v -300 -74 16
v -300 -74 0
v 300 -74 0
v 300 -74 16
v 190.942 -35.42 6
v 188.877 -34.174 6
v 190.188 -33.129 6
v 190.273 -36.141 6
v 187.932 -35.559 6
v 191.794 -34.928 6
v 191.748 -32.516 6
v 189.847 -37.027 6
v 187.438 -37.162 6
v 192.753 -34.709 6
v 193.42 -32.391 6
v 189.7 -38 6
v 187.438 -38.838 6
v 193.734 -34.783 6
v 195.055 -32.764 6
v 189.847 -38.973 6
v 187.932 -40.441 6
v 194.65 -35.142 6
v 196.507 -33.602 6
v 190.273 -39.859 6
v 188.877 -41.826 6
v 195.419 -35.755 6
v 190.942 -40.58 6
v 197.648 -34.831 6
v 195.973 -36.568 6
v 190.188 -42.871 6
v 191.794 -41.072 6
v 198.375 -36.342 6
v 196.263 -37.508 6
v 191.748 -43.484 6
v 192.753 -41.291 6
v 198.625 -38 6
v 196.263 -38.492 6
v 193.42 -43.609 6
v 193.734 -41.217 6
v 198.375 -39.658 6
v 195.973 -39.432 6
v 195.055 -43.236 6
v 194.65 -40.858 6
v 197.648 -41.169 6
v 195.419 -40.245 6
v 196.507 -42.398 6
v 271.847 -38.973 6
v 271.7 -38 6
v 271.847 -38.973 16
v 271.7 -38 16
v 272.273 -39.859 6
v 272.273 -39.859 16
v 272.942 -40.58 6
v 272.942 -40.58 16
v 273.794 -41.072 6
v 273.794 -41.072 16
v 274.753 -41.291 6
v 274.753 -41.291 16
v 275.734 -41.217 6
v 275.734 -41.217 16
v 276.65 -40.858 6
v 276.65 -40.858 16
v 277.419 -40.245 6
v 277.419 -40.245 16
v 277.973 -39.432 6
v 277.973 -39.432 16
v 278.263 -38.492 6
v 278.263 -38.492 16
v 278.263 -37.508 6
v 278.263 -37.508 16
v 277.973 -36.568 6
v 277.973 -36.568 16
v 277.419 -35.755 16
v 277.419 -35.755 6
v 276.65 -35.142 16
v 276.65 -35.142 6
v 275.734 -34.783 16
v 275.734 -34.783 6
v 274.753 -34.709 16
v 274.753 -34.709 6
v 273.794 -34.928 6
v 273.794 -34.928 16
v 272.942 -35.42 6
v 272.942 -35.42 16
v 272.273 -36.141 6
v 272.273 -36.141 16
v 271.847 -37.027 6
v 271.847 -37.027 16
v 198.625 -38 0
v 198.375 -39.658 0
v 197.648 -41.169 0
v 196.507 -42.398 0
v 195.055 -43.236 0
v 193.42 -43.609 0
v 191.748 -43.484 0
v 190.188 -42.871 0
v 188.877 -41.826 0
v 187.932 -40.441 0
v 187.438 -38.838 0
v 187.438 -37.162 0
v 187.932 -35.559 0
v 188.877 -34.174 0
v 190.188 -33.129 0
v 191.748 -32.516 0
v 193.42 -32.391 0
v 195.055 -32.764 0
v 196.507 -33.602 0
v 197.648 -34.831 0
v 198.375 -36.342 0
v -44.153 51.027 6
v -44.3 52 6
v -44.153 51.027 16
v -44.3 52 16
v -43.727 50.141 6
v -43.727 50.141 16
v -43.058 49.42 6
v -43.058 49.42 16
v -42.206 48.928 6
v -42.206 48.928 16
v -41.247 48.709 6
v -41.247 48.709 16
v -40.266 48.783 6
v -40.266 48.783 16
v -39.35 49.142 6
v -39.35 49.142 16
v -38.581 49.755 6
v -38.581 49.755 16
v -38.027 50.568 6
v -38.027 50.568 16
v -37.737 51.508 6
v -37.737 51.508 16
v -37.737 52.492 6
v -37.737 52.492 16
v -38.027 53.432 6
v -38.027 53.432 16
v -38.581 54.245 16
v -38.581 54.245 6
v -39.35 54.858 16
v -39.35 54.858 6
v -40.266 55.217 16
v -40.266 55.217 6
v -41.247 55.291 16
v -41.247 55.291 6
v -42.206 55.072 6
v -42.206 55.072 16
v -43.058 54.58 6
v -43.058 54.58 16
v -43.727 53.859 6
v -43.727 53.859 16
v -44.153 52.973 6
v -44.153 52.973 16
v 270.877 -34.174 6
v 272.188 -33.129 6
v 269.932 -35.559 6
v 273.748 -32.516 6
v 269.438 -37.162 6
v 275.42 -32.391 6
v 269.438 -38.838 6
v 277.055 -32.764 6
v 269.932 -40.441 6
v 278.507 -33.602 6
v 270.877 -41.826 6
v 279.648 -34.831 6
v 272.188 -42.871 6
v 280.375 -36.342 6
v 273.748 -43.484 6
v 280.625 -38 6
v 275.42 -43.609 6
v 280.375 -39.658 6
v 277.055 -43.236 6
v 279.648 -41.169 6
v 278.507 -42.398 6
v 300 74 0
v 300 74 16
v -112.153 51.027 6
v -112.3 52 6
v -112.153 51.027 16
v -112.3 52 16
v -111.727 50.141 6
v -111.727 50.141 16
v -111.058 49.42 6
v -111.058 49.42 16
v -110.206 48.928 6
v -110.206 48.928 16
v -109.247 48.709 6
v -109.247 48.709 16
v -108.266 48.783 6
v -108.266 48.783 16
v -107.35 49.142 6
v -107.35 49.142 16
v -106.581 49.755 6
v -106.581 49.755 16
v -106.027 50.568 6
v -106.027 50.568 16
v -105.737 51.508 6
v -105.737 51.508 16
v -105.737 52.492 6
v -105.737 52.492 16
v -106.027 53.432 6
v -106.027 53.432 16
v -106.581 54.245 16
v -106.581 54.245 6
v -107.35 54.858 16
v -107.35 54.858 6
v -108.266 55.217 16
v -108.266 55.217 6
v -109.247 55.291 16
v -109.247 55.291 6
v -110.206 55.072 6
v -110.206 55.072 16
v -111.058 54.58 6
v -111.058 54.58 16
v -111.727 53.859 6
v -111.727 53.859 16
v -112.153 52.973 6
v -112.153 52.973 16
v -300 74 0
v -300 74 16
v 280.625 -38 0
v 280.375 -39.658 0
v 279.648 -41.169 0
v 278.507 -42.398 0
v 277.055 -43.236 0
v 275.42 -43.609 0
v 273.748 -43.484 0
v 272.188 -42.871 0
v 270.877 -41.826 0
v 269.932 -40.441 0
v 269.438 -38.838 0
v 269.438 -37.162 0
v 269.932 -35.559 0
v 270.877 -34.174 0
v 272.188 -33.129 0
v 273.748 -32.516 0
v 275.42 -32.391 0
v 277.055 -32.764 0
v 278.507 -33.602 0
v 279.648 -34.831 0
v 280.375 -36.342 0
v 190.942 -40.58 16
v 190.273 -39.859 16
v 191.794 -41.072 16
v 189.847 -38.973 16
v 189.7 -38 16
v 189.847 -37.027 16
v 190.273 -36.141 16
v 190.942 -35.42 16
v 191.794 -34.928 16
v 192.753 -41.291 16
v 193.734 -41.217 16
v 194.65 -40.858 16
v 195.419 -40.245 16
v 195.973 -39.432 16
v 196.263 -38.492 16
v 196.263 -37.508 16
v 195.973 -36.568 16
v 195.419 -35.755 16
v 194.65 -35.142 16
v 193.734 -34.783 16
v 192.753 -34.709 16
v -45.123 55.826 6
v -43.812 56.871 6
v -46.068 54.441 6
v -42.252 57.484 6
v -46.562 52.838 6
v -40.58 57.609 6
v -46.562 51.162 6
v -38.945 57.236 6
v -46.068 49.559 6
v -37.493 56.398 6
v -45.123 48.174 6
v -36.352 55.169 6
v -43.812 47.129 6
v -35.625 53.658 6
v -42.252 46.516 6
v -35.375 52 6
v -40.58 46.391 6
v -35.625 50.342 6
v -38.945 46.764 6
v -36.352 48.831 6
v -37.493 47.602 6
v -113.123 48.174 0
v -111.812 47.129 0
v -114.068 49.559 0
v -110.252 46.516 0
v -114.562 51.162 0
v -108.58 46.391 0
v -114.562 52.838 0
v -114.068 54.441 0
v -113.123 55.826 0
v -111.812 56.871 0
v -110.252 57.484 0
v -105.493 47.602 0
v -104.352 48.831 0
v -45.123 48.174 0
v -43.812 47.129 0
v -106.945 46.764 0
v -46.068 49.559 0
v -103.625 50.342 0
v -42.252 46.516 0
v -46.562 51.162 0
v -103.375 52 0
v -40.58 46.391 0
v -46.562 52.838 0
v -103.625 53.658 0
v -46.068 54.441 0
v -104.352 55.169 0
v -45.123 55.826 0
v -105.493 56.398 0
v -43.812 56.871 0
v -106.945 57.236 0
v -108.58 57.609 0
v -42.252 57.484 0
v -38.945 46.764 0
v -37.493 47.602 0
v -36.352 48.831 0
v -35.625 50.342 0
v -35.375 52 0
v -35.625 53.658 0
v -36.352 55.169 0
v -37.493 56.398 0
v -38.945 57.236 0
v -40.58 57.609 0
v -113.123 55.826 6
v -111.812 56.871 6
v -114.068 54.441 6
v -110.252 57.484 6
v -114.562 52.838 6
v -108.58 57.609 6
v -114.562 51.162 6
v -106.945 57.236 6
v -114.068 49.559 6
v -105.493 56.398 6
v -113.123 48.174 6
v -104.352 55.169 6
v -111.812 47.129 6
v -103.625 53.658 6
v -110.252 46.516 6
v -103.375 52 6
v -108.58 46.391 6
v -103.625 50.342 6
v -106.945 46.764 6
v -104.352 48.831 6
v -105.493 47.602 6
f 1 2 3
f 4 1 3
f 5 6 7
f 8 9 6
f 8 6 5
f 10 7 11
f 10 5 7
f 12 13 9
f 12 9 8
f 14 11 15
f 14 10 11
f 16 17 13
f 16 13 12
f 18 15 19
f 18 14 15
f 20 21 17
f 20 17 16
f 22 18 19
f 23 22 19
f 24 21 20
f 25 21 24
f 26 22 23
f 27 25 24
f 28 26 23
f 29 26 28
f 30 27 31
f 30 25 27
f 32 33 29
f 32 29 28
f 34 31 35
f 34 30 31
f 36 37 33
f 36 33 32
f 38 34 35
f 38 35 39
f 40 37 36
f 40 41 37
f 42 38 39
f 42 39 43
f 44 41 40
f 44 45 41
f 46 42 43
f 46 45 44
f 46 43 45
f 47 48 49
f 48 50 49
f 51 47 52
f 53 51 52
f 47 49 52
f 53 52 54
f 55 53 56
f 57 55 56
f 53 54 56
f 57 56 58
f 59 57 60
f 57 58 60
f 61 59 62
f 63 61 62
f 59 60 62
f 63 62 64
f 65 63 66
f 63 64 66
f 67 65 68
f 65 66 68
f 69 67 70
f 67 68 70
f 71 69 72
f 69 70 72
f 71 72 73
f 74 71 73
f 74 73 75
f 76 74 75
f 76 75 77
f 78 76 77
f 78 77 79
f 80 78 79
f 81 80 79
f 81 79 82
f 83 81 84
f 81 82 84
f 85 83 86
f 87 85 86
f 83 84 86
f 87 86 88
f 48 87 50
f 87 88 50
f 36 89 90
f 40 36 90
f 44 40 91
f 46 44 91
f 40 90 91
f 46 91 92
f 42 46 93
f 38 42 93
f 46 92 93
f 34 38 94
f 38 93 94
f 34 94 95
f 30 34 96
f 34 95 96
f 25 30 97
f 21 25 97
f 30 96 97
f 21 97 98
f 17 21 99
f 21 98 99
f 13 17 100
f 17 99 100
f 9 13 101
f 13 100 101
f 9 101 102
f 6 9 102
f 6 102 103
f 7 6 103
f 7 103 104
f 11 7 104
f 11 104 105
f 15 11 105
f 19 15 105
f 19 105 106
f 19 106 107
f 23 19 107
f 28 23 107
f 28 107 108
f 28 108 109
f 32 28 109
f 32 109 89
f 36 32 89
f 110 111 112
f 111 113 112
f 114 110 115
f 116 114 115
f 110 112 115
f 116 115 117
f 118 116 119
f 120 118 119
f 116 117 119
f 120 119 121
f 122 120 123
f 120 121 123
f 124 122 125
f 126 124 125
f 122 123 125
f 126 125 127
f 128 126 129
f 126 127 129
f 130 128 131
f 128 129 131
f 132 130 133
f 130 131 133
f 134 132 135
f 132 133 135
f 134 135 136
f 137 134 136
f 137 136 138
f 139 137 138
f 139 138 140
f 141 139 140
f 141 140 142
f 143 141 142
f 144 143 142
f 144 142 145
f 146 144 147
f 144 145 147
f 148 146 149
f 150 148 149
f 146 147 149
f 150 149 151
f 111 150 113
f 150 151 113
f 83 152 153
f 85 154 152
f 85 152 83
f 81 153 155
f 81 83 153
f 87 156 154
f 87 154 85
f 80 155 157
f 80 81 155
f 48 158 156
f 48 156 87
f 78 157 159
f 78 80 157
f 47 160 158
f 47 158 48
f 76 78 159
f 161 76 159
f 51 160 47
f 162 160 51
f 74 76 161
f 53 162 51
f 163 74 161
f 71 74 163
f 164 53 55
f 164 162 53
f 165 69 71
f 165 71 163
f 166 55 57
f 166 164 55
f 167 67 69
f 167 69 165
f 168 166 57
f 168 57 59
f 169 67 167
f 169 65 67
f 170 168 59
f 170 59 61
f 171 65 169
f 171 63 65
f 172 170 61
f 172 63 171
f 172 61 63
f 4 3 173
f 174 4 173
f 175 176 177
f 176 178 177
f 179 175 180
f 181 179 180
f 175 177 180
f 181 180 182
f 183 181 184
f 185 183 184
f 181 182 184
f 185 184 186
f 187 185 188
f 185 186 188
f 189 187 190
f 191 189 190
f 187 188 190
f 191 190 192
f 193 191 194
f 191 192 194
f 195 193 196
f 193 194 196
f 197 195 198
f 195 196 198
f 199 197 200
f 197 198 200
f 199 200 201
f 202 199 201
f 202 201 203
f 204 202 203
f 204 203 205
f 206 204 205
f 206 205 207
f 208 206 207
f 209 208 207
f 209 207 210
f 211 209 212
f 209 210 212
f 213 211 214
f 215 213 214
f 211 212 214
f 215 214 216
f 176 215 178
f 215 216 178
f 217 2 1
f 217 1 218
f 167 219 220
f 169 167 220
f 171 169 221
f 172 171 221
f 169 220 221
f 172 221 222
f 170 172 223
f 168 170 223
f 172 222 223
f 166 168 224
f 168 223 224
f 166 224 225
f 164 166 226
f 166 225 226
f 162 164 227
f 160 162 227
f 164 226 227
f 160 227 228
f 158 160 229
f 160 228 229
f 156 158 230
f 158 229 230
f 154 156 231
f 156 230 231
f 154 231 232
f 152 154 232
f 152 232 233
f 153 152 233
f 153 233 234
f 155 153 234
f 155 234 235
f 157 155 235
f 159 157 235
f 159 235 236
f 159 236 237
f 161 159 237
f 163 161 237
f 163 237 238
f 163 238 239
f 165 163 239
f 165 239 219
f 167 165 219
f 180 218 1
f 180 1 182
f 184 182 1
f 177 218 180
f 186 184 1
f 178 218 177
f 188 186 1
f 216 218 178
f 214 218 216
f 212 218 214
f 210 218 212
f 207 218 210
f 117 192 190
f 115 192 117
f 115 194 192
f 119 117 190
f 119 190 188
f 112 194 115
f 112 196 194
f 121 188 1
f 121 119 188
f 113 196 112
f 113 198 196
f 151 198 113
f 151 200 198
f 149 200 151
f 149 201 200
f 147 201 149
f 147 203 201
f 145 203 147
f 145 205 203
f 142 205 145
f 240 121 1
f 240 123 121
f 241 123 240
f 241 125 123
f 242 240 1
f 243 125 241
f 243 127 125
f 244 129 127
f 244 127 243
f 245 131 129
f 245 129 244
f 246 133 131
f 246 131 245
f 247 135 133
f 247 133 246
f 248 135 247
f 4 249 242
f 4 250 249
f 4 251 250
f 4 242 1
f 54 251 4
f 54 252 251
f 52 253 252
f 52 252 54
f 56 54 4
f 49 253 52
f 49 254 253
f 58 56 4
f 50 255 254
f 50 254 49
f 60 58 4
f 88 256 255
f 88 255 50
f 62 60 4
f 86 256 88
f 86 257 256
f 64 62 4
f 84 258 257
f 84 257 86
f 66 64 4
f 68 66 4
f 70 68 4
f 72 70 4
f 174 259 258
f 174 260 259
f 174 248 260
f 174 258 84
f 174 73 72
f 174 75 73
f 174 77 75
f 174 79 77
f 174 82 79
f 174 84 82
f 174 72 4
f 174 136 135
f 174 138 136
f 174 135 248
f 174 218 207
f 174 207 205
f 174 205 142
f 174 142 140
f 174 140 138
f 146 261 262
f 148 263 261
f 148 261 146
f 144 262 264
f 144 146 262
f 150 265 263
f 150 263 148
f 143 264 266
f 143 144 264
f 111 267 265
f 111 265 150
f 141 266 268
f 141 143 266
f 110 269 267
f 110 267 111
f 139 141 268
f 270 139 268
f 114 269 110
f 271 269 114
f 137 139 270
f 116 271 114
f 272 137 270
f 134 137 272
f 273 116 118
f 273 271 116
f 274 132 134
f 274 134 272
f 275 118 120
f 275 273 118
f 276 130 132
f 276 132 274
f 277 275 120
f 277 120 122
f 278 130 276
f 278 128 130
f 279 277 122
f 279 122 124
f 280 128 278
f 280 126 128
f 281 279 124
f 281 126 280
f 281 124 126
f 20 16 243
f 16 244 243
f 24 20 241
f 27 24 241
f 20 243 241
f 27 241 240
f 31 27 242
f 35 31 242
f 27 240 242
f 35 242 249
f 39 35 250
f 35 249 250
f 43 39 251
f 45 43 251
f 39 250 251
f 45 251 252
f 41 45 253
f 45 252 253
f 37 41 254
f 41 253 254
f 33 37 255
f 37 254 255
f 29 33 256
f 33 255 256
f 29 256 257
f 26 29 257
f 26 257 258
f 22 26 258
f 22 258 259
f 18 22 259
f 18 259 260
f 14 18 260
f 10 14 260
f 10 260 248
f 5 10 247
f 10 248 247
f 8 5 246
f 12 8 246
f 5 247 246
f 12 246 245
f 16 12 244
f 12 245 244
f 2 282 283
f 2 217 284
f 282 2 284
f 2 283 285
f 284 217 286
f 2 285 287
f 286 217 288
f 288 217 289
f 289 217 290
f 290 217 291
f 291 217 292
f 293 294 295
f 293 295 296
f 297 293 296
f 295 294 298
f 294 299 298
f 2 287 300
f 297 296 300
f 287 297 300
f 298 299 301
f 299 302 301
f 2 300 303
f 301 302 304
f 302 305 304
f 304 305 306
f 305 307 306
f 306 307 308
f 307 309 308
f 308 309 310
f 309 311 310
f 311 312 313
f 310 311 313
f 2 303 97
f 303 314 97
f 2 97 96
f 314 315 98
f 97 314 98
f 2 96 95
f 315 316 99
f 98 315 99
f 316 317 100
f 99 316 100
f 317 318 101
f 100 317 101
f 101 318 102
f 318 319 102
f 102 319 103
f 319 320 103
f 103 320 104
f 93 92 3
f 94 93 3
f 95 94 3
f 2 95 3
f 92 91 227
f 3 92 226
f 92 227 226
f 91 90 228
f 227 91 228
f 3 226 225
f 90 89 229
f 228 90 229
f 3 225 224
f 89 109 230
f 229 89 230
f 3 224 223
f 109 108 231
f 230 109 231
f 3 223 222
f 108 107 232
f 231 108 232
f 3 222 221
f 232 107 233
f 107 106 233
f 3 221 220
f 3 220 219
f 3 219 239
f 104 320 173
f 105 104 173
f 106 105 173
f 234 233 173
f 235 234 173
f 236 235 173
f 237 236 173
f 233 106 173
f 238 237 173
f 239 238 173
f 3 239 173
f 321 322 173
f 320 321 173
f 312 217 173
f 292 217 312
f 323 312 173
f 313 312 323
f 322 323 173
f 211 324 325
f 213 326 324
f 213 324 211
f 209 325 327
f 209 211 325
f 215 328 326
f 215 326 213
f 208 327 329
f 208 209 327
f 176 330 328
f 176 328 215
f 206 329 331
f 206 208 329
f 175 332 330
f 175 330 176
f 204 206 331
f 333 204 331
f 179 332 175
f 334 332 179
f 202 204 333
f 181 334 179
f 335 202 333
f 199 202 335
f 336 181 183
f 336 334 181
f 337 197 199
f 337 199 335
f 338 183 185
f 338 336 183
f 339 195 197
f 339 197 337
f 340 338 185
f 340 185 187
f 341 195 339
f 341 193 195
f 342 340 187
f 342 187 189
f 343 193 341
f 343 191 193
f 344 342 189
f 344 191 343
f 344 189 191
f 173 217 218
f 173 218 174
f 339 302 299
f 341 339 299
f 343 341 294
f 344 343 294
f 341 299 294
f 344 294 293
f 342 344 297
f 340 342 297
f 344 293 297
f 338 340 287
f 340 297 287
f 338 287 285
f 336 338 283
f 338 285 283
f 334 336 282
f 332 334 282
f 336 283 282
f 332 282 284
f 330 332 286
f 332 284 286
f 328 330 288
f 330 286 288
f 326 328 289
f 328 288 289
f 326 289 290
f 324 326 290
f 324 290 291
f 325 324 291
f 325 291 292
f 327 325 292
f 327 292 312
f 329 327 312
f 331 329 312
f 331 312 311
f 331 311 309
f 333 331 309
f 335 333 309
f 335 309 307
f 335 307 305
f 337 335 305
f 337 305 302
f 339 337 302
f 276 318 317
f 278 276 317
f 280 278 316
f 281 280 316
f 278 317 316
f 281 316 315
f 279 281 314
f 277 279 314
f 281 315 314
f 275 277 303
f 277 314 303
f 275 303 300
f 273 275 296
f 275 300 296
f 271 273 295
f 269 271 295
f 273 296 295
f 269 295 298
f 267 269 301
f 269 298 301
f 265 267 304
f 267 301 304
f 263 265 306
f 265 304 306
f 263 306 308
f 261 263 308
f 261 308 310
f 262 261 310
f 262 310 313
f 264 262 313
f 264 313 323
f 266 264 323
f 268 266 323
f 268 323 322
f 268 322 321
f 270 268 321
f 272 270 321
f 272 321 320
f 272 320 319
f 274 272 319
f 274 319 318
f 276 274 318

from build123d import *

# Parameters (mm, degrees)
F0_W           = 600
F0_H           = 148
F1_DEPTH       = 16
F5_D           = 6.6
F5_CBORE_D     = 11.25
F5_CBORE_DEPTH = 6


with BuildPart() as f1:
    # F0 (on Top) → F1 (new body)
    with BuildSketch(Plane.XY):
        Rectangle(F0_W, F0_H)
    extrude(amount=F1_DEPTH)

    # F5 (through all)
    with Locations(Plane(origin=(0, 0, 0), x_dir=(1, 0, 0), z_dir=(0, 0, -1))):
        with Locations((-109, -52), (-41, -52), (193, 38), (275, 38)):
            CounterBoreHole(F5_D / 2, F5_CBORE_D / 2, F5_CBORE_DEPTH)


solid = f1.part
